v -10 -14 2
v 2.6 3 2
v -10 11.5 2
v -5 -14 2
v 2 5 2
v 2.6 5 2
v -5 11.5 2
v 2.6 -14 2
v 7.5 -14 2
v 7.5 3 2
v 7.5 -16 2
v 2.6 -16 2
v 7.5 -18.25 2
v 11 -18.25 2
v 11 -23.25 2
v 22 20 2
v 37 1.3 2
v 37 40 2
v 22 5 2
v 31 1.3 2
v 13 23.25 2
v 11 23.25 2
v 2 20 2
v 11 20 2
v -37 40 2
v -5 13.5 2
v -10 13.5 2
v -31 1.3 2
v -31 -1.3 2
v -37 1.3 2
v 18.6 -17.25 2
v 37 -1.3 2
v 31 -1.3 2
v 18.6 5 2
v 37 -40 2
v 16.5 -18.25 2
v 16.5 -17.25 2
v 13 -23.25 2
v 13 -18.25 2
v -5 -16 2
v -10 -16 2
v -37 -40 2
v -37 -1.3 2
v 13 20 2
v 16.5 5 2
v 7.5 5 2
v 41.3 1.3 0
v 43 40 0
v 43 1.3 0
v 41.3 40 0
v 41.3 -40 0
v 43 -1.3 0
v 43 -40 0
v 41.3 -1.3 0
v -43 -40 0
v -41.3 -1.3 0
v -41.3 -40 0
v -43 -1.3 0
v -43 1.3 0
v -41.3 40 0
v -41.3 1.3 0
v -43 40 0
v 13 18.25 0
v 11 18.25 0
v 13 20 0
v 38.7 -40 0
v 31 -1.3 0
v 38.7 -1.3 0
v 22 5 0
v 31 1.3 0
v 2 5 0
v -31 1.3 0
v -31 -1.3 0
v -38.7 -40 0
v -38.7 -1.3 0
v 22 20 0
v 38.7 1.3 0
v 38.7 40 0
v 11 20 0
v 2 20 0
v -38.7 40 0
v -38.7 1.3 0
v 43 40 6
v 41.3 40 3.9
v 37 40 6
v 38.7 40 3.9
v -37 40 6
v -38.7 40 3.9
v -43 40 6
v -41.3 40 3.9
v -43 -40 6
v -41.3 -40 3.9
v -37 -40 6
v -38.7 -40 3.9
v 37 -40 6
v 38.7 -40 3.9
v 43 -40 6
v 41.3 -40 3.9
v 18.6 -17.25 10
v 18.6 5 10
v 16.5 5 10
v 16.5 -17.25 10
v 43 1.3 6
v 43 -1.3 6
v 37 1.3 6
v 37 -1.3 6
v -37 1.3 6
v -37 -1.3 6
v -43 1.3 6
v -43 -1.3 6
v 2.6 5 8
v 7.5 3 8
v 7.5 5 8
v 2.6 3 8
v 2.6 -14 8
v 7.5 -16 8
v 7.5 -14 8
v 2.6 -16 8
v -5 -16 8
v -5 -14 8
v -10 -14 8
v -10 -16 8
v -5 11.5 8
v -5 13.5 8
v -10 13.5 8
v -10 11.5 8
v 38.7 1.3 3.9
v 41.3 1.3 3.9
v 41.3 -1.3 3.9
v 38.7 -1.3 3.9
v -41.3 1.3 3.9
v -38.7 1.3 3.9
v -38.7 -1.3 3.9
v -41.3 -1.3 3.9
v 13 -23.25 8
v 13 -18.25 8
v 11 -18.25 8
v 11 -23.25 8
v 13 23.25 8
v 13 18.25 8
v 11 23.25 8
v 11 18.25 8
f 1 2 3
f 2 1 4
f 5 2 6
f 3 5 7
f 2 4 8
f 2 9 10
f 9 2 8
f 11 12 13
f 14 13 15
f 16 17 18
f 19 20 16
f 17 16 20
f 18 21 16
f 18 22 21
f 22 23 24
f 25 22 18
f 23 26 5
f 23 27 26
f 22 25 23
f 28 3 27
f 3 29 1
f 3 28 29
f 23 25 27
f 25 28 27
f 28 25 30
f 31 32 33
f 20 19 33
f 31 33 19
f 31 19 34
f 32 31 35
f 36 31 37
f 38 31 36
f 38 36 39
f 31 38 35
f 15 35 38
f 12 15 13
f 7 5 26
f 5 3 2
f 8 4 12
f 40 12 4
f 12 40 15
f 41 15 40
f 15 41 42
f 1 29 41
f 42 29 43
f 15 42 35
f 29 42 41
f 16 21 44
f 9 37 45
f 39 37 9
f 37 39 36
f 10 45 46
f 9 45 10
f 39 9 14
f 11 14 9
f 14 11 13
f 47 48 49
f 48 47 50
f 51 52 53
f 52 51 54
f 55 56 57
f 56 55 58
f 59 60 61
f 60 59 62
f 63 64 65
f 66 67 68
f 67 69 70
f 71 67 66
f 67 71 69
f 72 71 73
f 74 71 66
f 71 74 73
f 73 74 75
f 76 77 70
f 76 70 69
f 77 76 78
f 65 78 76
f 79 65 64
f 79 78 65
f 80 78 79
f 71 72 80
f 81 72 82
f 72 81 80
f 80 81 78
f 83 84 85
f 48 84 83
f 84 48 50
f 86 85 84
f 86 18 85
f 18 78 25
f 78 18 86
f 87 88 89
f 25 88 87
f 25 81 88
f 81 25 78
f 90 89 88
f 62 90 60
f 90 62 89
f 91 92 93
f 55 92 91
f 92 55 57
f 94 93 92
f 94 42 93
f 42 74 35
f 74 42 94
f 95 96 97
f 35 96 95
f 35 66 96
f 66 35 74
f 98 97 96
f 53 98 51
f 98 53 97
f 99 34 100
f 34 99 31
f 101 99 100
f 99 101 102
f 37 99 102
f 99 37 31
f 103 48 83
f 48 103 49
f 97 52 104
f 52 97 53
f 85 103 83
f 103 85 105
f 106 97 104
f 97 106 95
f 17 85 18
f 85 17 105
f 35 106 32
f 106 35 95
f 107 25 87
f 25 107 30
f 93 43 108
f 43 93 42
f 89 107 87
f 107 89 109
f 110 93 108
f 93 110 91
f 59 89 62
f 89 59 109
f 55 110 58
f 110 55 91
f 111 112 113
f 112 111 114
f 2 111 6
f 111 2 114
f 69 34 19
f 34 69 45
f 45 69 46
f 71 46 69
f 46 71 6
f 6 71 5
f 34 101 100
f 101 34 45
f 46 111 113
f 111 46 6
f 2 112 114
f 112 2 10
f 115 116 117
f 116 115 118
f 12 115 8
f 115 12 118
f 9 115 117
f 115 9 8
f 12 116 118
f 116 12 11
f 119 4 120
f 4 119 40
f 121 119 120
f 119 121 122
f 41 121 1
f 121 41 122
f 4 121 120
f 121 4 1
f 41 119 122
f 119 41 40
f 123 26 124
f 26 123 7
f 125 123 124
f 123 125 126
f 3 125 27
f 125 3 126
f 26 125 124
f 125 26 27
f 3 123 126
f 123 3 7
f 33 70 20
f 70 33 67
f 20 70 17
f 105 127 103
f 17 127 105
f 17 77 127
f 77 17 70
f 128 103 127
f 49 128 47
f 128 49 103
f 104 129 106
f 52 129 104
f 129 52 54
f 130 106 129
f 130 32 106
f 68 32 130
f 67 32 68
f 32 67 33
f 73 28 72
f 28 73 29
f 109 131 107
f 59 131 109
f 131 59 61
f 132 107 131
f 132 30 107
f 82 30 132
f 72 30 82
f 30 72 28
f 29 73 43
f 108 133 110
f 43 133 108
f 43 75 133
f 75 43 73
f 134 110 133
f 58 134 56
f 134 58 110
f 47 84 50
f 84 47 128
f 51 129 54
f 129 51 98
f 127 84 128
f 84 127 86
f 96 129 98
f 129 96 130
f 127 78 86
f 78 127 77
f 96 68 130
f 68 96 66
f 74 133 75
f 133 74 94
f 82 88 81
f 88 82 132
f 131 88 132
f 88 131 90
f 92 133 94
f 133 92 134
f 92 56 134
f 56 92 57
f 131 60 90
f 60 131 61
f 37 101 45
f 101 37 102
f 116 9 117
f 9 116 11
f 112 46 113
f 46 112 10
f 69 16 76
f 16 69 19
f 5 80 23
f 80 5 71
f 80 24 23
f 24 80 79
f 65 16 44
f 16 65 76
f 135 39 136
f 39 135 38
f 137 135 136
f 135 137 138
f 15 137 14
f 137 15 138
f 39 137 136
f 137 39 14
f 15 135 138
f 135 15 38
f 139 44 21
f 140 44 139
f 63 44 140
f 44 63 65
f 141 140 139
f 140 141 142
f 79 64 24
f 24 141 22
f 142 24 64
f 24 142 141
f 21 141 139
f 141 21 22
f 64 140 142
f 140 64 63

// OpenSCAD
$fn=30;
ts=2;


ugol=[10+0.5+1,15+0.5+1,2+0.4];//размеры уголка высота/ширина/толщина
pole=[80,80,ts];// [20,30,ts];;//размеры поля
stk=[ts,10,6*ts];//размеры стойки 
stl=[ts*3+stk.x, ts*3+stk.y, stk.z];//размеры столба

fp=[stk.x-0.2,stk.y-0.4,50];//форма прижимной пласитны 

hz=10;
hx=4.5;
dlh=10;

plt=42;
step=5;
pin=[9, step*7+1.5, 12];
botr=8;
prk=[20,15,pin.z*2];

all();
module all(){
    difference(){
        union(){
            translate([0,0,ts/2])cube(pole,true);
            translate([plt/2-pin.x+ts/2+0.1,0,ts+botr/2])cube([pin.x+ts,pin.y-ts,botr],true);
            translate([pole.x/2,0,3*ts/2])cube([3*ts,pole.y, 3*ts],true);
            translate([-pole.x/2,0,3*ts/2])cube([3*ts,pole.y, 3*ts],true);
            translate([plt/2-pin.x-pin.x/2-step/2+0.1,-(-step+ts/2),4*ts/2])cube([step, ts,4*ts],true);
            translate([plt/2-pin.x-pin.x/2-step/2+0.1,-step*3,4*ts/2])cube([step, ts,4*ts],true);
            translate([plt/2-pin.x-pin.x/2-step*3,-step*3,4*ts/2])cube([step, ts,4*ts],true);
            translate([plt/2-pin.x-pin.x/2-step*3,2.5*step,4*ts/2])cube([step, ts,4*ts],true);
        }
        translate([pole.x/2,0,3*ts/2])cube([stl.x*2+ts,ts+0.6, 4*ts],true);
        translate([-pole.x/2,0,3*ts/2])cube([stl.x*2+ts,ts+0.6, 4*ts],true);
        translate([pole.x/2,0,ts-0.1])cube([ts+0.6,pole.y+ts, ts*2],true);
        translate([-pole.x/2,0,ts-0.1])cube([ts+0.6,pole.y+ts, ts*2],true);
        translate([plt/2-pin.x,0,ts+pin.z/2])cube(pin,true);
        translate([plt/2-pin.x,2.5*step,0])cube(prk,true);//отверстие для прищепки
    }
    translate([plt/2-pin.x,-pin.y/2-step/2,4*ts/2])cube([ts,step, 4*ts],true);
    translate([plt/2-pin.x,pin.y/2+step/2,4*ts/2])cube([ts,step, 4*ts],true);
}

//test00();
module test00(){
    rotate([0,90,0])translate([-stl.x/2,0,0]){rotate([0,0,180])difference(){
            translate([0,0,(fp.z+5*ts)/2])cube([ stl.x,ugol.y+2*ts, fp.z+5*ts],true);
            translate([0,0,(fp.z-5*ts)])ug();
        }
        translate([0,0,ts])cube([ stl.x, pole.y, ts*2],true);
    }
}



//ug();
module ug(){
    translate([0,ugol.y/2-ugol.z/2,ugol.x/2+ts*3])cube([pole.x*2,ts,ugol.x],true);
    translate([0,0,ugol.x/2+ts*3+ugol.x/2-ugol.z/2])cube([pole.x*2+4*ts,ugol.y,ts],true);
    translate([0,ugol.y/2-ugol.z/2-ts+0.1,ugol.x/2+ts*2+ugol.x/2-ugol.z/2+0.1])cube([pole.x*2+4*ts,ts,ts],true);
}
